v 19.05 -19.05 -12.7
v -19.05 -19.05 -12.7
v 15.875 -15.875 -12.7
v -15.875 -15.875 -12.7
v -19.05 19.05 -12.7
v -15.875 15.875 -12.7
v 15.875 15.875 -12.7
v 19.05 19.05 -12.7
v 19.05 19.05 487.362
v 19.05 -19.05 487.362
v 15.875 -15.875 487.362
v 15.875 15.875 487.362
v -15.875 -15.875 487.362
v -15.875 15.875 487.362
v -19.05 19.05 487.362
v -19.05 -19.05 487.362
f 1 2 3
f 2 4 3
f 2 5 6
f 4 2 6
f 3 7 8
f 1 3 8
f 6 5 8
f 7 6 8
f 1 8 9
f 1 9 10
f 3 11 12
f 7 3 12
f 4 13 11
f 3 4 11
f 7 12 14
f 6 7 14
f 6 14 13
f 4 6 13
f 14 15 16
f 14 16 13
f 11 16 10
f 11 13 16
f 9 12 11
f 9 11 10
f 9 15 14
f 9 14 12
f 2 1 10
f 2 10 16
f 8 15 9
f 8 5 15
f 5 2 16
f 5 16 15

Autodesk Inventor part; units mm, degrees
ref_plane "Start Plane" through (0, 0, -12.7) normal (0, 0, 1) x (1, 0, 0)
ref_plane "End Plane" through (0, 0, 487.3625) normal (0, 0, 1) x (1, 0, 0)
sketch "Sketch" plane through (0, 0, 0) normal (0, 0, 1) x (1, 0, 0)
  line L0 (-19.05, 19.05) -> (19.05, 19.05)
  line L1 (19.05, 19.05) -> (19.05, -19.05)
  line L2 (19.05, -19.05) -> (-19.05, -19.05)
  line L3 (-19.05, -19.05) -> (-19.05, 19.05)
  line L4 (15.875, 15.875) -> (-15.875, 15.875)
  line L5 (-15.875, 15.875) -> (-15.875, -15.875)
  line L6 (-15.875, -15.875) -> (15.875, -15.875)
  line L7 (15.875, -15.875) -> (15.875, 15.875)
  point P0 (0, 0)
  point P1 (0, 19.05)
  point P2 (-19.05, 0)
  dimension "width" = 38.1
  dimension "d1" = 3.175
extrude "Body" add sketch "Sketch" along normal up to surface (500.0625 mm away) from surface at -12.7
sketch "Sketch4" plane through (0, 0, 0) normal (0, 0, 1) x (1, 0, 0)
  line L0 (0, 0) -> (10, 0)
ref_plane "Work Plane4" through (0, 0, 0) normal (0, -1, 0) x (1, 0, 0)
sketch "Sketch5" plane through (0, 0, 0) normal (0, -1, 0) x (1, 0, 0)
  line L0 (-2, -12.7) -> (12, -12.7)
  line L1 (-2, 487.3625) -> (12, 487.3625)
  dimension "d9" = 500.0625
ref_plane "Work Plane6" through (762, 19.05, -12.7) normal (0, 0, -1) x (-1, 0, 0)
split "Split2" plane through (762, 19.05, -12.7) removes the side toward (0, 0, -1)
ref_plane "Work Plane7" through (38.1, 19.05, 487.3625) normal (0, 0, 1) x (1, 0, 0)
split "Split3" plane through (38.1, 19.05, 487.3625) removes the side toward (0, 0, 1)
equation "\"G_OFFSET_START\" = 12.7"
equation "\"G_OFFSET_END\" = -20.6375"
equation "\"d4\" = -G_OFFSET_START"
equation "\"d5\" = length + G_OFFSET_END"
equation "\"G_L\" = 812.8"
equation "\"length\" = 508"
properties part number "1.5x1.5x.125 Tube" material "Aluminum-6061"
